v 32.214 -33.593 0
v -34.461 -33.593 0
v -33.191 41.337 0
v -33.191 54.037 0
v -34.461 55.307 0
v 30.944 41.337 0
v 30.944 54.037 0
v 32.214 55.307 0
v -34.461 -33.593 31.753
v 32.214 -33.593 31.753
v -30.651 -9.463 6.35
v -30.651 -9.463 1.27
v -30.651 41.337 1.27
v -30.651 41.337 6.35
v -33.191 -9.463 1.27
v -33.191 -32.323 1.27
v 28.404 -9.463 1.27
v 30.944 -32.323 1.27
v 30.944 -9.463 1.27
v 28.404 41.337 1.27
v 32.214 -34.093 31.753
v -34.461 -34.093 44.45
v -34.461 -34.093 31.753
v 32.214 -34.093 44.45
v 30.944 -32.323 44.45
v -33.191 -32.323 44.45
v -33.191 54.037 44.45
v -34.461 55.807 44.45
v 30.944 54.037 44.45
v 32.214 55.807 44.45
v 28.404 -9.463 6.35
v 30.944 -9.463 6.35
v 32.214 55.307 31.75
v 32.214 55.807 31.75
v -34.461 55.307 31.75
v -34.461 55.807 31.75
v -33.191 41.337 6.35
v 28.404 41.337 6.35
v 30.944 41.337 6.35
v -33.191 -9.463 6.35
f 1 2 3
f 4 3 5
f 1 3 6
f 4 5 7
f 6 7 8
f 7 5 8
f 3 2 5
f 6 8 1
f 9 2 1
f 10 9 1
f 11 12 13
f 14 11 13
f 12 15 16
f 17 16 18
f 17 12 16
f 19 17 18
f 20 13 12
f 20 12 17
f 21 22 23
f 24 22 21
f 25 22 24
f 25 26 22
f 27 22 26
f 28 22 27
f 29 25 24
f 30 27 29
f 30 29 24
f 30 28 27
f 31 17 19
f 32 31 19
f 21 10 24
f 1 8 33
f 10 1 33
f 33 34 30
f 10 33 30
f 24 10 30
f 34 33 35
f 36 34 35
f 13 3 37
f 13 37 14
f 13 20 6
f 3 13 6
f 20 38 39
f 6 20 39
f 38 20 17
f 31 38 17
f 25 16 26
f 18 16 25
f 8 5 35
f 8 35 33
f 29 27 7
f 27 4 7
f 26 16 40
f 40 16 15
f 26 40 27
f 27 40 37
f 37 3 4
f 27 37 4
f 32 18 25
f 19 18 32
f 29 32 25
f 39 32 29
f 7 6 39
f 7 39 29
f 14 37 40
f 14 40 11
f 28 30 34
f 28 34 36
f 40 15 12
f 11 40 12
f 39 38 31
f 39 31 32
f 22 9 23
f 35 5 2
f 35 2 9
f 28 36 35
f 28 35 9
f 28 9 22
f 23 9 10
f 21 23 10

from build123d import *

# Parameters (mm, degrees)
F0_W     = 66.675
F0_H     = 88.9
F1_DEPTH = 44.45
F2_T     = -1.27
F4_DEPTH = 5.08
F5_W     = 66.675
F5_H     = 12.7
F6_DEPTH = 0.5
F7_W     = 66.675
F7_H     = 12.6965791702
F8_DEPTH = 0.5
F9_DEPTH = 25.4


with BuildPart() as f1:
    # F0 (on Top) → F1 (new body)
    with BuildSketch(Plane.XY):
        with Locations((-1.1231470853, 10.8568438743)):
            Rectangle(F0_W, F0_H)
    extrude(amount=F1_DEPTH)

    # F2
    f2_openings = [f1.faces().sort_by_distance(p)[0] for p in [
        (-1.123147, 10.856844, 44.45),
    ]]
    offset(amount=F2_T, openings=f2_openings)

    # F3 (on face) → F4 (join)
    with BuildSketch(Plane.XY.offset(1.27)):
        Polygon((30.9443529147, 41.3368438743), (28.4043529147, 41.3368438743), (28.4043529147, -0.1921561257), (28.4043529147, -3.3671561257), (28.4043529147, -9.4631561257), (30.9443529147, -9.4631561257), align=None)
        Polygon((-30.6506470853, 41.3368438743), (-33.1906470853, 41.3368438743), (-33.1906470853, -9.4631561257), (-30.6506470853, -9.4631561257), (-30.6506470853, -3.3671561257), (-30.6506470853, -0.1921561257), align=None)
    extrude(amount=F4_DEPTH)

    # F5 (on face) → F6 (join)
    with BuildSketch(Plane(origin=(0, 55.3068438743, 0), x_dir=(-1, 0, 0), z_dir=(0, 1, 0))):
        with Locations((1.1231470853, 38.1)):
            Rectangle(F5_W, F5_H)
    extrude(amount=F6_DEPTH)

    # F7 (on face) → F8 (join)
    with BuildSketch(Plane.XZ.offset(33.5931561257)):
        with Locations((-1.1231470853, 38.1017104149)):
            Rectangle(F7_W, F7_H)
    extrude(amount=F8_DEPTH)

    # F3 (on face) → F9 (cut)
    with BuildSketch(Plane.XY.offset(1.27)):
        Polygon((-33.1906470853, 54.0368438743), (-33.1906470853, 41.3368438743), (-30.6506470853, 41.3368438743), (28.4043529147, 41.3368438743), (30.9443529147, 41.3368438743), (30.9443529147, 54.0368438743), align=None)
    extrude(amount=-F9_DEPTH, mode=Mode.SUBTRACT)


solid = f1.part
